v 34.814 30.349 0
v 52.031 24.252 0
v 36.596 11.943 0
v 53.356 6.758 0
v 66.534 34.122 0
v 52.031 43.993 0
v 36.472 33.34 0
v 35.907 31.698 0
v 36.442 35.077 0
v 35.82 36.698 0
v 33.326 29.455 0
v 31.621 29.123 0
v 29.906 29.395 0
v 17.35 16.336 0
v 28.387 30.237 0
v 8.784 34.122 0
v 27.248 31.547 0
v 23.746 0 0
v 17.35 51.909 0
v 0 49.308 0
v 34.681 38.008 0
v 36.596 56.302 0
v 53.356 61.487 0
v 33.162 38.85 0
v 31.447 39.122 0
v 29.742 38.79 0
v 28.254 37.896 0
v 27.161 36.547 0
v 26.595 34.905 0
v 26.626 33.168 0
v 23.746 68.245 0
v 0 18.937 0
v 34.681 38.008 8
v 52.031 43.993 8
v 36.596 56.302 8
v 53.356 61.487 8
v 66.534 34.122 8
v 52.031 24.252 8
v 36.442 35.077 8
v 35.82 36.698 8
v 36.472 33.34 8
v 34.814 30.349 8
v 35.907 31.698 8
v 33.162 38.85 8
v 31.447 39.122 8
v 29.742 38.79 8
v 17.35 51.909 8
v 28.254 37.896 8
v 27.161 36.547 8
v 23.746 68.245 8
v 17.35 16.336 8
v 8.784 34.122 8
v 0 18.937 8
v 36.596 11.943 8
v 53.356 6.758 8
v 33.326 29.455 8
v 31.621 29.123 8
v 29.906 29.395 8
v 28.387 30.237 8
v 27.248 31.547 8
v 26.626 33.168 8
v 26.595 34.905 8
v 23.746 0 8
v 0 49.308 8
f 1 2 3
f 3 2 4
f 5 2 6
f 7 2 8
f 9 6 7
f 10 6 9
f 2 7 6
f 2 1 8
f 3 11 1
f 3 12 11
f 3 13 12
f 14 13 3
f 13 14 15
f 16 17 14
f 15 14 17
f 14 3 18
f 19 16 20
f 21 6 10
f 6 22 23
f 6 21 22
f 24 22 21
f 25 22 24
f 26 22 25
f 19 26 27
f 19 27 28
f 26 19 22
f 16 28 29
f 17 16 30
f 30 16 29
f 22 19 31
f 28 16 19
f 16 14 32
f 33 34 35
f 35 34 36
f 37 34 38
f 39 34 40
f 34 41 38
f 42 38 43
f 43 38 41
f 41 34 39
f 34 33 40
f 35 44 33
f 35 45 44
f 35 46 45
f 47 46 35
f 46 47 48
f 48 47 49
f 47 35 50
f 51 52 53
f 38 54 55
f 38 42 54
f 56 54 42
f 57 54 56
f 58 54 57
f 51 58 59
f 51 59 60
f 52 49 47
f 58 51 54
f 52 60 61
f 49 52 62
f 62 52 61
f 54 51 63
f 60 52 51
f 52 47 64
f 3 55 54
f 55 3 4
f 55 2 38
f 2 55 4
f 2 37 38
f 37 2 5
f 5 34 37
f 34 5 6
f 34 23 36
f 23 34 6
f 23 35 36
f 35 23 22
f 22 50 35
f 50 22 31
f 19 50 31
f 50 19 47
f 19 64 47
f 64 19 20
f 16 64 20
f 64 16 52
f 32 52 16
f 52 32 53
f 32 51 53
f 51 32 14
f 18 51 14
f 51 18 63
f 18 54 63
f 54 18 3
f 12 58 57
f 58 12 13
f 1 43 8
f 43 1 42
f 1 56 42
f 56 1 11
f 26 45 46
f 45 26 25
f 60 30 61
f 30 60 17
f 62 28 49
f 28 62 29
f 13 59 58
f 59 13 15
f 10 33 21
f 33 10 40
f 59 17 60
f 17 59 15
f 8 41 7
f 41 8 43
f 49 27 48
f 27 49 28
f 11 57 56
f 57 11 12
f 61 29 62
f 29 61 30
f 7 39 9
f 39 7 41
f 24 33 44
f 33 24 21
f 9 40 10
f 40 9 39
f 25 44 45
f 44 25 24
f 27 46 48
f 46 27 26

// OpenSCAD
$fn = 32;

// ----------------------------------------------------------------------
// Star wheel: 7-point blunt, R35
// ----------------------------------------------------------------------

// --- parameters (mm) ---
n_points = 7;             // number of points / teeth
r_out = 35;               // tip radius
r_in = 22.75;             // root radius
bore_r = 5;               // centre bore radius
plate_t = 8;              // plate thickness, Z (extrusion height)
bore_d = 10;              // centre bore diameter
fit_tol = 0.1;            // declared fit tolerance (prompt contract)
free_tol = 0.3;           // declared free tolerance (prompt contract)

profile = [[66.534, 34.122], [52.031, 43.993], [53.356, 61.487], [36.596, 56.302], [23.746, 68.245], [17.35, 51.909], [0, 49.308], [8.784, 34.122], [0, 18.937], [17.35, 16.336], [23.746, 0], [36.596, 11.943], [53.356, 6.758], [52.031, 24.252]];  // primary outline, 14 points, counter clockwise
void_1 = [[36.442, 35.077], [35.82, 36.698], [34.681, 38.008], [33.162, 38.85], [31.447, 39.122], [29.742, 38.79], [28.254, 37.896], [27.161, 36.547], [26.595, 34.905], [26.626, 33.168], [27.248, 31.547], [28.387, 30.237], [29.906, 29.395], [31.621, 29.123], [33.326, 29.455], [34.814, 30.349], [35.907, 31.698], [36.472, 33.34]];  // centre bore, 18 points

// --- the one profile operation ---
difference() {
  linear_extrude(height = plate_t) polygon(points = profile);
  translate([0, 0, -1])
    linear_extrude(height = plate_t + 2) polygon(points = void_1);
}
